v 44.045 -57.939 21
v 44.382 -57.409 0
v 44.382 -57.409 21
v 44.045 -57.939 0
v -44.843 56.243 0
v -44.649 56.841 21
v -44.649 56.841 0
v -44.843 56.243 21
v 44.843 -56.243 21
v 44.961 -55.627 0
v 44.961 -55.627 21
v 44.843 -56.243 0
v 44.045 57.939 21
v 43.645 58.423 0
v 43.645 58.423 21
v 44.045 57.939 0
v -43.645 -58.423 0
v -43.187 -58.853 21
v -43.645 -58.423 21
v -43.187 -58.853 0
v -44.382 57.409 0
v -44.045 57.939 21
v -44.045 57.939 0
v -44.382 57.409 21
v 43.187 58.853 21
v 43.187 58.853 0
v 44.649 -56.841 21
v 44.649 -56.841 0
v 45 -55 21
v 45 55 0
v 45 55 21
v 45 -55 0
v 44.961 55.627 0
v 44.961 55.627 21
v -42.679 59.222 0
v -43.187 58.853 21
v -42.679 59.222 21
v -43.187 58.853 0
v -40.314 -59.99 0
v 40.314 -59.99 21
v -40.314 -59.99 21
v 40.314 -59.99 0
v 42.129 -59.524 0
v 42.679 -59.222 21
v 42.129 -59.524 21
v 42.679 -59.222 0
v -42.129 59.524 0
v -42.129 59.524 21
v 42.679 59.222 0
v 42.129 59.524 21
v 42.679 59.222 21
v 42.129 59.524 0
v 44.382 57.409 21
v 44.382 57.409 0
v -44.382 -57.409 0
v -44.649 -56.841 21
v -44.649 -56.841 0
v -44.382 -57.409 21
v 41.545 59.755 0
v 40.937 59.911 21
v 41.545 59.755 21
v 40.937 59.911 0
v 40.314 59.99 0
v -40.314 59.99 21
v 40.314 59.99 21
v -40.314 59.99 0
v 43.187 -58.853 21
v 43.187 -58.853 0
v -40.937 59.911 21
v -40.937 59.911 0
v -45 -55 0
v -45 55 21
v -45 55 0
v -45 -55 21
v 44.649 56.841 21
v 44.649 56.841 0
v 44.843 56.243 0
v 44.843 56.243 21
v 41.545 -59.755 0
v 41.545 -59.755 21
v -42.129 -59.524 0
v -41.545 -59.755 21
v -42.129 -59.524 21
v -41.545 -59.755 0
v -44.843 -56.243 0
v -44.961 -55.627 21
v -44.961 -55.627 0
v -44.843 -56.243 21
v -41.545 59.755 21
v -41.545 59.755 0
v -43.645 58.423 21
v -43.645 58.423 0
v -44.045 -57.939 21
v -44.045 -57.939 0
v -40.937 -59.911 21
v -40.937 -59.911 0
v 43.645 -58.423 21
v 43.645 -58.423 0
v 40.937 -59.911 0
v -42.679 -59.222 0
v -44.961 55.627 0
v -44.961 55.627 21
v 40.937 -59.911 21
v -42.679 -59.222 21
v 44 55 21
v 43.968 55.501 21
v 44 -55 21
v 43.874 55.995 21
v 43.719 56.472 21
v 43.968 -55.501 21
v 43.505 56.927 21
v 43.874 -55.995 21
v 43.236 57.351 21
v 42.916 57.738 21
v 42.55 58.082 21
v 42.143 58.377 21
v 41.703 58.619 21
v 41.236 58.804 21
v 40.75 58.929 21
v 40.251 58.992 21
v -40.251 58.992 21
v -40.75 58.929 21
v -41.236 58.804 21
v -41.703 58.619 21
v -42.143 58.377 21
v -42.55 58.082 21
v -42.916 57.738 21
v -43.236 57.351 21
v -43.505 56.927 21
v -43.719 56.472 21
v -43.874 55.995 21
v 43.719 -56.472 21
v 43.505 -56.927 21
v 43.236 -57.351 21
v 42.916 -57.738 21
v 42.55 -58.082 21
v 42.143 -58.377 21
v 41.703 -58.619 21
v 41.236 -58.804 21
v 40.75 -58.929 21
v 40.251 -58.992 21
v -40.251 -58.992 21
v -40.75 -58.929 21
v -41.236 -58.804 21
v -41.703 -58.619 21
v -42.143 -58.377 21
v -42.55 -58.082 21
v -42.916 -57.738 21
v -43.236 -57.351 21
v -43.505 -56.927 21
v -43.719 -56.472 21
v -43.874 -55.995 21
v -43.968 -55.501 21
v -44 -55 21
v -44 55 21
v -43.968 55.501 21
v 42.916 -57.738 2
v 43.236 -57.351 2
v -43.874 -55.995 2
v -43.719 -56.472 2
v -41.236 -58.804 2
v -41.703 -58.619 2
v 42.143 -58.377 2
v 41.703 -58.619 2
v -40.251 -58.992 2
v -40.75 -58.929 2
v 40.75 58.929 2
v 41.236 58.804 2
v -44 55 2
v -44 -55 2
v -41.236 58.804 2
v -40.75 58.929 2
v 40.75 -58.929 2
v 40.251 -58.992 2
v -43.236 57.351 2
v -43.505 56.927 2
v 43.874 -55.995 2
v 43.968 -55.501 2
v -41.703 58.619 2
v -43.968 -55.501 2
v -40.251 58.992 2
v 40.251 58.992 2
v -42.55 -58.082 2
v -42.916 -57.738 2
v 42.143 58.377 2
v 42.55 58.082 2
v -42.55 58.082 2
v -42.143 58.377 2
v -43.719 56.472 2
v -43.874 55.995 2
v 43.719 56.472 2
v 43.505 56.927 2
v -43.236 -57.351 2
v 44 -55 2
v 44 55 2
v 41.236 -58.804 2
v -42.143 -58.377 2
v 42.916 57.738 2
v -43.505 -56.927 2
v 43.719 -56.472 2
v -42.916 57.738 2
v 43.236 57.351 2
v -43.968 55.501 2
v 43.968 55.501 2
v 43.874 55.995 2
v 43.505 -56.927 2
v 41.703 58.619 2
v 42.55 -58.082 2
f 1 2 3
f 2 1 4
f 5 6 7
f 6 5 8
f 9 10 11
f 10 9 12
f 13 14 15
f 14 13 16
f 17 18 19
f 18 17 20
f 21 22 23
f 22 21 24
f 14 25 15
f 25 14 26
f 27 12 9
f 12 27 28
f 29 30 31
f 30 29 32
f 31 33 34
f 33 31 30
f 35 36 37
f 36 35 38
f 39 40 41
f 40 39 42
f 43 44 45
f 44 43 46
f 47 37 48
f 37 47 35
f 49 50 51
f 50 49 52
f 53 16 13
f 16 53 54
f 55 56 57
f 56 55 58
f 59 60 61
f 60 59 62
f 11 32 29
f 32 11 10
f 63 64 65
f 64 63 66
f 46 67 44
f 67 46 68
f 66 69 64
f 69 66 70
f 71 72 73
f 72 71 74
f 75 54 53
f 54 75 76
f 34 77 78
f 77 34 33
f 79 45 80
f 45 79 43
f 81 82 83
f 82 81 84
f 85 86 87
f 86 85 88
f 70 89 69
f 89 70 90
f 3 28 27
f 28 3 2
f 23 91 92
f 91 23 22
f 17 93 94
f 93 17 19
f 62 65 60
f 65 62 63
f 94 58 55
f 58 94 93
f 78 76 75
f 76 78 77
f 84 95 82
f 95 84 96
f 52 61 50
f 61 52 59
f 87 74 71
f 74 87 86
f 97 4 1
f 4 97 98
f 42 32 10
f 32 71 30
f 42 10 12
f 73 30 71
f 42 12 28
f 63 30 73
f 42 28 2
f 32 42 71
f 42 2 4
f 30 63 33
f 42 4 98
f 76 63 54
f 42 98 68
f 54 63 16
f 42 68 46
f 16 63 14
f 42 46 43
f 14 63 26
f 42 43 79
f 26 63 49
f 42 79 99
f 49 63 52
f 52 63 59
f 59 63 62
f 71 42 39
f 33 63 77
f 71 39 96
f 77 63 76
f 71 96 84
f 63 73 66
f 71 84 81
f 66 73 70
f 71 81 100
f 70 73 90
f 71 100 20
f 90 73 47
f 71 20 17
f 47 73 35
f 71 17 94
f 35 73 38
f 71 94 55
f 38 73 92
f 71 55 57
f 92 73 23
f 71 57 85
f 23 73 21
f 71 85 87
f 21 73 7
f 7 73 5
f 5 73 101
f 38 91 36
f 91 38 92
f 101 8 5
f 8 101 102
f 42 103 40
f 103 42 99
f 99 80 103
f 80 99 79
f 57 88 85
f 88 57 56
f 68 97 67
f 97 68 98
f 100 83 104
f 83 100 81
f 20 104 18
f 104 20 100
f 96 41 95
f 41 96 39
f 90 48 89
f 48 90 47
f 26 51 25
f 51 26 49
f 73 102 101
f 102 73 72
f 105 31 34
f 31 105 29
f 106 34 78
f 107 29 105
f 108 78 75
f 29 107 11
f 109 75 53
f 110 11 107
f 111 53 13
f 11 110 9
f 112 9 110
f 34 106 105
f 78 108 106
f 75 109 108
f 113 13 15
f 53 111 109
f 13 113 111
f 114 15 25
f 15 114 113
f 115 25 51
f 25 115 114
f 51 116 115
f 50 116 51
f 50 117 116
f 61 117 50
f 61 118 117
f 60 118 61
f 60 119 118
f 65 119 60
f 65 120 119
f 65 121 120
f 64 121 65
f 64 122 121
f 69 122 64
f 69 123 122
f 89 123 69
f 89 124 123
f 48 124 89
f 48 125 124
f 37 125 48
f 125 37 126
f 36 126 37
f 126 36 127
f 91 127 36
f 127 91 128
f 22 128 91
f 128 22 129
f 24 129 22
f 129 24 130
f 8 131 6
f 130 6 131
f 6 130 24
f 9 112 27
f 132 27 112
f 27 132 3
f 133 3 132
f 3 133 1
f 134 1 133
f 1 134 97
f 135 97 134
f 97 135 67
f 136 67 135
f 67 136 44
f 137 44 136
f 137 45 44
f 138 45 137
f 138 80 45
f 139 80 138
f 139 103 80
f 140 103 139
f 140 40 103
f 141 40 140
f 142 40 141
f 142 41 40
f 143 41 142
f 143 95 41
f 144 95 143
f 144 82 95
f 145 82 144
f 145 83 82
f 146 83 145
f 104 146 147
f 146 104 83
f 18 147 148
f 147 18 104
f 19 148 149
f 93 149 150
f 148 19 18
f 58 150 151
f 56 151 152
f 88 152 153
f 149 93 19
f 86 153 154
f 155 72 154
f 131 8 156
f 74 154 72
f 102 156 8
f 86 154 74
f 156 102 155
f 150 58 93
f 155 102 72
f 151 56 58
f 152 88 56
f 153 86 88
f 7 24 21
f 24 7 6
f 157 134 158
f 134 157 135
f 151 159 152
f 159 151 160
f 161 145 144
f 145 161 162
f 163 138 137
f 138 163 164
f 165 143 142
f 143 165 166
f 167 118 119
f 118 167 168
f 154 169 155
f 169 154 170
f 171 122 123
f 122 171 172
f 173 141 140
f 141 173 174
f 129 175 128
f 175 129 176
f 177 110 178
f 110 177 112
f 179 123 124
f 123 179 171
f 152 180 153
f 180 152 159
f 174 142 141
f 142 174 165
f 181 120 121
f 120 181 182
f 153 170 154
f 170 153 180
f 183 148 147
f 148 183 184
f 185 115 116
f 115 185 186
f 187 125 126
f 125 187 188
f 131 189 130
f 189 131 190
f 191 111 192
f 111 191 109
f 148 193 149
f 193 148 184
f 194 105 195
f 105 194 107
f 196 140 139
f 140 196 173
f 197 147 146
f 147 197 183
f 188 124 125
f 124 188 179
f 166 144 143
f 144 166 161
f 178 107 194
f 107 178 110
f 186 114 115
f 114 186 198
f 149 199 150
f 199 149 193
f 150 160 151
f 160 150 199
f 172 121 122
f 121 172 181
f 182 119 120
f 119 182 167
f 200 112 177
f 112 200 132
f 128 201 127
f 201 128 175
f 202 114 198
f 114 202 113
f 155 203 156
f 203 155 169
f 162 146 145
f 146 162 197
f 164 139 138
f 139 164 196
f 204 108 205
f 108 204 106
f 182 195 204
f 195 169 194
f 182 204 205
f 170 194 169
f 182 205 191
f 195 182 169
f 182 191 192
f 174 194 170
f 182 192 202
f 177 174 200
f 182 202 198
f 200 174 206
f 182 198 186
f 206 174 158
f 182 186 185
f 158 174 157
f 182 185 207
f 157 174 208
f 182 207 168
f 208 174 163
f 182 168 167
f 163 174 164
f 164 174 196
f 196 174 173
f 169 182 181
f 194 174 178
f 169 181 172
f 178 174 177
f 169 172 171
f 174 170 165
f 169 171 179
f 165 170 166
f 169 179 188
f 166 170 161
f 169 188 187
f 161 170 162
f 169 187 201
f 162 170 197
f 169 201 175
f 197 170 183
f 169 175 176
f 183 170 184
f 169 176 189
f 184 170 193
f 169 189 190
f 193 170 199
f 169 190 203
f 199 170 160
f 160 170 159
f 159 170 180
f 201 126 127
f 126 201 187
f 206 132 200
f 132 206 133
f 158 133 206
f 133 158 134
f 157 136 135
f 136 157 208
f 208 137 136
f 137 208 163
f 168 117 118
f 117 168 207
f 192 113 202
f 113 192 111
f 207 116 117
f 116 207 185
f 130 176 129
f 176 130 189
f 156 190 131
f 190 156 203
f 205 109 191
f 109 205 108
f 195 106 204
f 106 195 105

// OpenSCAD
$fn = 50;


difference() {
	union() {
		hull() {
			translate(v = [-40.0000000000, 55.0000000000, 0]) {
				cylinder(h = 21, r = 5);
			}
			translate(v = [40.0000000000, 55.0000000000, 0]) {
				cylinder(h = 21, r = 5);
			}
			translate(v = [-40.0000000000, -55.0000000000, 0]) {
				cylinder(h = 21, r = 5);
			}
			translate(v = [40.0000000000, -55.0000000000, 0]) {
				cylinder(h = 21, r = 5);
			}
		}
	}
	union() {
		translate(v = [0, 0, 2]) {
			hull() {
				translate(v = [-40.0000000000, 55.0000000000, 0]) {
					cylinder(h = 19, r = 4);
				}
				translate(v = [40.0000000000, 55.0000000000, 0]) {
					cylinder(h = 19, r = 4);
				}
				translate(v = [-40.0000000000, -55.0000000000, 0]) {
					cylinder(h = 19, r = 4);
				}
				translate(v = [40.0000000000, -55.0000000000, 0]) {
					cylinder(h = 19, r = 4);
				}
			}
		}
	}
}
